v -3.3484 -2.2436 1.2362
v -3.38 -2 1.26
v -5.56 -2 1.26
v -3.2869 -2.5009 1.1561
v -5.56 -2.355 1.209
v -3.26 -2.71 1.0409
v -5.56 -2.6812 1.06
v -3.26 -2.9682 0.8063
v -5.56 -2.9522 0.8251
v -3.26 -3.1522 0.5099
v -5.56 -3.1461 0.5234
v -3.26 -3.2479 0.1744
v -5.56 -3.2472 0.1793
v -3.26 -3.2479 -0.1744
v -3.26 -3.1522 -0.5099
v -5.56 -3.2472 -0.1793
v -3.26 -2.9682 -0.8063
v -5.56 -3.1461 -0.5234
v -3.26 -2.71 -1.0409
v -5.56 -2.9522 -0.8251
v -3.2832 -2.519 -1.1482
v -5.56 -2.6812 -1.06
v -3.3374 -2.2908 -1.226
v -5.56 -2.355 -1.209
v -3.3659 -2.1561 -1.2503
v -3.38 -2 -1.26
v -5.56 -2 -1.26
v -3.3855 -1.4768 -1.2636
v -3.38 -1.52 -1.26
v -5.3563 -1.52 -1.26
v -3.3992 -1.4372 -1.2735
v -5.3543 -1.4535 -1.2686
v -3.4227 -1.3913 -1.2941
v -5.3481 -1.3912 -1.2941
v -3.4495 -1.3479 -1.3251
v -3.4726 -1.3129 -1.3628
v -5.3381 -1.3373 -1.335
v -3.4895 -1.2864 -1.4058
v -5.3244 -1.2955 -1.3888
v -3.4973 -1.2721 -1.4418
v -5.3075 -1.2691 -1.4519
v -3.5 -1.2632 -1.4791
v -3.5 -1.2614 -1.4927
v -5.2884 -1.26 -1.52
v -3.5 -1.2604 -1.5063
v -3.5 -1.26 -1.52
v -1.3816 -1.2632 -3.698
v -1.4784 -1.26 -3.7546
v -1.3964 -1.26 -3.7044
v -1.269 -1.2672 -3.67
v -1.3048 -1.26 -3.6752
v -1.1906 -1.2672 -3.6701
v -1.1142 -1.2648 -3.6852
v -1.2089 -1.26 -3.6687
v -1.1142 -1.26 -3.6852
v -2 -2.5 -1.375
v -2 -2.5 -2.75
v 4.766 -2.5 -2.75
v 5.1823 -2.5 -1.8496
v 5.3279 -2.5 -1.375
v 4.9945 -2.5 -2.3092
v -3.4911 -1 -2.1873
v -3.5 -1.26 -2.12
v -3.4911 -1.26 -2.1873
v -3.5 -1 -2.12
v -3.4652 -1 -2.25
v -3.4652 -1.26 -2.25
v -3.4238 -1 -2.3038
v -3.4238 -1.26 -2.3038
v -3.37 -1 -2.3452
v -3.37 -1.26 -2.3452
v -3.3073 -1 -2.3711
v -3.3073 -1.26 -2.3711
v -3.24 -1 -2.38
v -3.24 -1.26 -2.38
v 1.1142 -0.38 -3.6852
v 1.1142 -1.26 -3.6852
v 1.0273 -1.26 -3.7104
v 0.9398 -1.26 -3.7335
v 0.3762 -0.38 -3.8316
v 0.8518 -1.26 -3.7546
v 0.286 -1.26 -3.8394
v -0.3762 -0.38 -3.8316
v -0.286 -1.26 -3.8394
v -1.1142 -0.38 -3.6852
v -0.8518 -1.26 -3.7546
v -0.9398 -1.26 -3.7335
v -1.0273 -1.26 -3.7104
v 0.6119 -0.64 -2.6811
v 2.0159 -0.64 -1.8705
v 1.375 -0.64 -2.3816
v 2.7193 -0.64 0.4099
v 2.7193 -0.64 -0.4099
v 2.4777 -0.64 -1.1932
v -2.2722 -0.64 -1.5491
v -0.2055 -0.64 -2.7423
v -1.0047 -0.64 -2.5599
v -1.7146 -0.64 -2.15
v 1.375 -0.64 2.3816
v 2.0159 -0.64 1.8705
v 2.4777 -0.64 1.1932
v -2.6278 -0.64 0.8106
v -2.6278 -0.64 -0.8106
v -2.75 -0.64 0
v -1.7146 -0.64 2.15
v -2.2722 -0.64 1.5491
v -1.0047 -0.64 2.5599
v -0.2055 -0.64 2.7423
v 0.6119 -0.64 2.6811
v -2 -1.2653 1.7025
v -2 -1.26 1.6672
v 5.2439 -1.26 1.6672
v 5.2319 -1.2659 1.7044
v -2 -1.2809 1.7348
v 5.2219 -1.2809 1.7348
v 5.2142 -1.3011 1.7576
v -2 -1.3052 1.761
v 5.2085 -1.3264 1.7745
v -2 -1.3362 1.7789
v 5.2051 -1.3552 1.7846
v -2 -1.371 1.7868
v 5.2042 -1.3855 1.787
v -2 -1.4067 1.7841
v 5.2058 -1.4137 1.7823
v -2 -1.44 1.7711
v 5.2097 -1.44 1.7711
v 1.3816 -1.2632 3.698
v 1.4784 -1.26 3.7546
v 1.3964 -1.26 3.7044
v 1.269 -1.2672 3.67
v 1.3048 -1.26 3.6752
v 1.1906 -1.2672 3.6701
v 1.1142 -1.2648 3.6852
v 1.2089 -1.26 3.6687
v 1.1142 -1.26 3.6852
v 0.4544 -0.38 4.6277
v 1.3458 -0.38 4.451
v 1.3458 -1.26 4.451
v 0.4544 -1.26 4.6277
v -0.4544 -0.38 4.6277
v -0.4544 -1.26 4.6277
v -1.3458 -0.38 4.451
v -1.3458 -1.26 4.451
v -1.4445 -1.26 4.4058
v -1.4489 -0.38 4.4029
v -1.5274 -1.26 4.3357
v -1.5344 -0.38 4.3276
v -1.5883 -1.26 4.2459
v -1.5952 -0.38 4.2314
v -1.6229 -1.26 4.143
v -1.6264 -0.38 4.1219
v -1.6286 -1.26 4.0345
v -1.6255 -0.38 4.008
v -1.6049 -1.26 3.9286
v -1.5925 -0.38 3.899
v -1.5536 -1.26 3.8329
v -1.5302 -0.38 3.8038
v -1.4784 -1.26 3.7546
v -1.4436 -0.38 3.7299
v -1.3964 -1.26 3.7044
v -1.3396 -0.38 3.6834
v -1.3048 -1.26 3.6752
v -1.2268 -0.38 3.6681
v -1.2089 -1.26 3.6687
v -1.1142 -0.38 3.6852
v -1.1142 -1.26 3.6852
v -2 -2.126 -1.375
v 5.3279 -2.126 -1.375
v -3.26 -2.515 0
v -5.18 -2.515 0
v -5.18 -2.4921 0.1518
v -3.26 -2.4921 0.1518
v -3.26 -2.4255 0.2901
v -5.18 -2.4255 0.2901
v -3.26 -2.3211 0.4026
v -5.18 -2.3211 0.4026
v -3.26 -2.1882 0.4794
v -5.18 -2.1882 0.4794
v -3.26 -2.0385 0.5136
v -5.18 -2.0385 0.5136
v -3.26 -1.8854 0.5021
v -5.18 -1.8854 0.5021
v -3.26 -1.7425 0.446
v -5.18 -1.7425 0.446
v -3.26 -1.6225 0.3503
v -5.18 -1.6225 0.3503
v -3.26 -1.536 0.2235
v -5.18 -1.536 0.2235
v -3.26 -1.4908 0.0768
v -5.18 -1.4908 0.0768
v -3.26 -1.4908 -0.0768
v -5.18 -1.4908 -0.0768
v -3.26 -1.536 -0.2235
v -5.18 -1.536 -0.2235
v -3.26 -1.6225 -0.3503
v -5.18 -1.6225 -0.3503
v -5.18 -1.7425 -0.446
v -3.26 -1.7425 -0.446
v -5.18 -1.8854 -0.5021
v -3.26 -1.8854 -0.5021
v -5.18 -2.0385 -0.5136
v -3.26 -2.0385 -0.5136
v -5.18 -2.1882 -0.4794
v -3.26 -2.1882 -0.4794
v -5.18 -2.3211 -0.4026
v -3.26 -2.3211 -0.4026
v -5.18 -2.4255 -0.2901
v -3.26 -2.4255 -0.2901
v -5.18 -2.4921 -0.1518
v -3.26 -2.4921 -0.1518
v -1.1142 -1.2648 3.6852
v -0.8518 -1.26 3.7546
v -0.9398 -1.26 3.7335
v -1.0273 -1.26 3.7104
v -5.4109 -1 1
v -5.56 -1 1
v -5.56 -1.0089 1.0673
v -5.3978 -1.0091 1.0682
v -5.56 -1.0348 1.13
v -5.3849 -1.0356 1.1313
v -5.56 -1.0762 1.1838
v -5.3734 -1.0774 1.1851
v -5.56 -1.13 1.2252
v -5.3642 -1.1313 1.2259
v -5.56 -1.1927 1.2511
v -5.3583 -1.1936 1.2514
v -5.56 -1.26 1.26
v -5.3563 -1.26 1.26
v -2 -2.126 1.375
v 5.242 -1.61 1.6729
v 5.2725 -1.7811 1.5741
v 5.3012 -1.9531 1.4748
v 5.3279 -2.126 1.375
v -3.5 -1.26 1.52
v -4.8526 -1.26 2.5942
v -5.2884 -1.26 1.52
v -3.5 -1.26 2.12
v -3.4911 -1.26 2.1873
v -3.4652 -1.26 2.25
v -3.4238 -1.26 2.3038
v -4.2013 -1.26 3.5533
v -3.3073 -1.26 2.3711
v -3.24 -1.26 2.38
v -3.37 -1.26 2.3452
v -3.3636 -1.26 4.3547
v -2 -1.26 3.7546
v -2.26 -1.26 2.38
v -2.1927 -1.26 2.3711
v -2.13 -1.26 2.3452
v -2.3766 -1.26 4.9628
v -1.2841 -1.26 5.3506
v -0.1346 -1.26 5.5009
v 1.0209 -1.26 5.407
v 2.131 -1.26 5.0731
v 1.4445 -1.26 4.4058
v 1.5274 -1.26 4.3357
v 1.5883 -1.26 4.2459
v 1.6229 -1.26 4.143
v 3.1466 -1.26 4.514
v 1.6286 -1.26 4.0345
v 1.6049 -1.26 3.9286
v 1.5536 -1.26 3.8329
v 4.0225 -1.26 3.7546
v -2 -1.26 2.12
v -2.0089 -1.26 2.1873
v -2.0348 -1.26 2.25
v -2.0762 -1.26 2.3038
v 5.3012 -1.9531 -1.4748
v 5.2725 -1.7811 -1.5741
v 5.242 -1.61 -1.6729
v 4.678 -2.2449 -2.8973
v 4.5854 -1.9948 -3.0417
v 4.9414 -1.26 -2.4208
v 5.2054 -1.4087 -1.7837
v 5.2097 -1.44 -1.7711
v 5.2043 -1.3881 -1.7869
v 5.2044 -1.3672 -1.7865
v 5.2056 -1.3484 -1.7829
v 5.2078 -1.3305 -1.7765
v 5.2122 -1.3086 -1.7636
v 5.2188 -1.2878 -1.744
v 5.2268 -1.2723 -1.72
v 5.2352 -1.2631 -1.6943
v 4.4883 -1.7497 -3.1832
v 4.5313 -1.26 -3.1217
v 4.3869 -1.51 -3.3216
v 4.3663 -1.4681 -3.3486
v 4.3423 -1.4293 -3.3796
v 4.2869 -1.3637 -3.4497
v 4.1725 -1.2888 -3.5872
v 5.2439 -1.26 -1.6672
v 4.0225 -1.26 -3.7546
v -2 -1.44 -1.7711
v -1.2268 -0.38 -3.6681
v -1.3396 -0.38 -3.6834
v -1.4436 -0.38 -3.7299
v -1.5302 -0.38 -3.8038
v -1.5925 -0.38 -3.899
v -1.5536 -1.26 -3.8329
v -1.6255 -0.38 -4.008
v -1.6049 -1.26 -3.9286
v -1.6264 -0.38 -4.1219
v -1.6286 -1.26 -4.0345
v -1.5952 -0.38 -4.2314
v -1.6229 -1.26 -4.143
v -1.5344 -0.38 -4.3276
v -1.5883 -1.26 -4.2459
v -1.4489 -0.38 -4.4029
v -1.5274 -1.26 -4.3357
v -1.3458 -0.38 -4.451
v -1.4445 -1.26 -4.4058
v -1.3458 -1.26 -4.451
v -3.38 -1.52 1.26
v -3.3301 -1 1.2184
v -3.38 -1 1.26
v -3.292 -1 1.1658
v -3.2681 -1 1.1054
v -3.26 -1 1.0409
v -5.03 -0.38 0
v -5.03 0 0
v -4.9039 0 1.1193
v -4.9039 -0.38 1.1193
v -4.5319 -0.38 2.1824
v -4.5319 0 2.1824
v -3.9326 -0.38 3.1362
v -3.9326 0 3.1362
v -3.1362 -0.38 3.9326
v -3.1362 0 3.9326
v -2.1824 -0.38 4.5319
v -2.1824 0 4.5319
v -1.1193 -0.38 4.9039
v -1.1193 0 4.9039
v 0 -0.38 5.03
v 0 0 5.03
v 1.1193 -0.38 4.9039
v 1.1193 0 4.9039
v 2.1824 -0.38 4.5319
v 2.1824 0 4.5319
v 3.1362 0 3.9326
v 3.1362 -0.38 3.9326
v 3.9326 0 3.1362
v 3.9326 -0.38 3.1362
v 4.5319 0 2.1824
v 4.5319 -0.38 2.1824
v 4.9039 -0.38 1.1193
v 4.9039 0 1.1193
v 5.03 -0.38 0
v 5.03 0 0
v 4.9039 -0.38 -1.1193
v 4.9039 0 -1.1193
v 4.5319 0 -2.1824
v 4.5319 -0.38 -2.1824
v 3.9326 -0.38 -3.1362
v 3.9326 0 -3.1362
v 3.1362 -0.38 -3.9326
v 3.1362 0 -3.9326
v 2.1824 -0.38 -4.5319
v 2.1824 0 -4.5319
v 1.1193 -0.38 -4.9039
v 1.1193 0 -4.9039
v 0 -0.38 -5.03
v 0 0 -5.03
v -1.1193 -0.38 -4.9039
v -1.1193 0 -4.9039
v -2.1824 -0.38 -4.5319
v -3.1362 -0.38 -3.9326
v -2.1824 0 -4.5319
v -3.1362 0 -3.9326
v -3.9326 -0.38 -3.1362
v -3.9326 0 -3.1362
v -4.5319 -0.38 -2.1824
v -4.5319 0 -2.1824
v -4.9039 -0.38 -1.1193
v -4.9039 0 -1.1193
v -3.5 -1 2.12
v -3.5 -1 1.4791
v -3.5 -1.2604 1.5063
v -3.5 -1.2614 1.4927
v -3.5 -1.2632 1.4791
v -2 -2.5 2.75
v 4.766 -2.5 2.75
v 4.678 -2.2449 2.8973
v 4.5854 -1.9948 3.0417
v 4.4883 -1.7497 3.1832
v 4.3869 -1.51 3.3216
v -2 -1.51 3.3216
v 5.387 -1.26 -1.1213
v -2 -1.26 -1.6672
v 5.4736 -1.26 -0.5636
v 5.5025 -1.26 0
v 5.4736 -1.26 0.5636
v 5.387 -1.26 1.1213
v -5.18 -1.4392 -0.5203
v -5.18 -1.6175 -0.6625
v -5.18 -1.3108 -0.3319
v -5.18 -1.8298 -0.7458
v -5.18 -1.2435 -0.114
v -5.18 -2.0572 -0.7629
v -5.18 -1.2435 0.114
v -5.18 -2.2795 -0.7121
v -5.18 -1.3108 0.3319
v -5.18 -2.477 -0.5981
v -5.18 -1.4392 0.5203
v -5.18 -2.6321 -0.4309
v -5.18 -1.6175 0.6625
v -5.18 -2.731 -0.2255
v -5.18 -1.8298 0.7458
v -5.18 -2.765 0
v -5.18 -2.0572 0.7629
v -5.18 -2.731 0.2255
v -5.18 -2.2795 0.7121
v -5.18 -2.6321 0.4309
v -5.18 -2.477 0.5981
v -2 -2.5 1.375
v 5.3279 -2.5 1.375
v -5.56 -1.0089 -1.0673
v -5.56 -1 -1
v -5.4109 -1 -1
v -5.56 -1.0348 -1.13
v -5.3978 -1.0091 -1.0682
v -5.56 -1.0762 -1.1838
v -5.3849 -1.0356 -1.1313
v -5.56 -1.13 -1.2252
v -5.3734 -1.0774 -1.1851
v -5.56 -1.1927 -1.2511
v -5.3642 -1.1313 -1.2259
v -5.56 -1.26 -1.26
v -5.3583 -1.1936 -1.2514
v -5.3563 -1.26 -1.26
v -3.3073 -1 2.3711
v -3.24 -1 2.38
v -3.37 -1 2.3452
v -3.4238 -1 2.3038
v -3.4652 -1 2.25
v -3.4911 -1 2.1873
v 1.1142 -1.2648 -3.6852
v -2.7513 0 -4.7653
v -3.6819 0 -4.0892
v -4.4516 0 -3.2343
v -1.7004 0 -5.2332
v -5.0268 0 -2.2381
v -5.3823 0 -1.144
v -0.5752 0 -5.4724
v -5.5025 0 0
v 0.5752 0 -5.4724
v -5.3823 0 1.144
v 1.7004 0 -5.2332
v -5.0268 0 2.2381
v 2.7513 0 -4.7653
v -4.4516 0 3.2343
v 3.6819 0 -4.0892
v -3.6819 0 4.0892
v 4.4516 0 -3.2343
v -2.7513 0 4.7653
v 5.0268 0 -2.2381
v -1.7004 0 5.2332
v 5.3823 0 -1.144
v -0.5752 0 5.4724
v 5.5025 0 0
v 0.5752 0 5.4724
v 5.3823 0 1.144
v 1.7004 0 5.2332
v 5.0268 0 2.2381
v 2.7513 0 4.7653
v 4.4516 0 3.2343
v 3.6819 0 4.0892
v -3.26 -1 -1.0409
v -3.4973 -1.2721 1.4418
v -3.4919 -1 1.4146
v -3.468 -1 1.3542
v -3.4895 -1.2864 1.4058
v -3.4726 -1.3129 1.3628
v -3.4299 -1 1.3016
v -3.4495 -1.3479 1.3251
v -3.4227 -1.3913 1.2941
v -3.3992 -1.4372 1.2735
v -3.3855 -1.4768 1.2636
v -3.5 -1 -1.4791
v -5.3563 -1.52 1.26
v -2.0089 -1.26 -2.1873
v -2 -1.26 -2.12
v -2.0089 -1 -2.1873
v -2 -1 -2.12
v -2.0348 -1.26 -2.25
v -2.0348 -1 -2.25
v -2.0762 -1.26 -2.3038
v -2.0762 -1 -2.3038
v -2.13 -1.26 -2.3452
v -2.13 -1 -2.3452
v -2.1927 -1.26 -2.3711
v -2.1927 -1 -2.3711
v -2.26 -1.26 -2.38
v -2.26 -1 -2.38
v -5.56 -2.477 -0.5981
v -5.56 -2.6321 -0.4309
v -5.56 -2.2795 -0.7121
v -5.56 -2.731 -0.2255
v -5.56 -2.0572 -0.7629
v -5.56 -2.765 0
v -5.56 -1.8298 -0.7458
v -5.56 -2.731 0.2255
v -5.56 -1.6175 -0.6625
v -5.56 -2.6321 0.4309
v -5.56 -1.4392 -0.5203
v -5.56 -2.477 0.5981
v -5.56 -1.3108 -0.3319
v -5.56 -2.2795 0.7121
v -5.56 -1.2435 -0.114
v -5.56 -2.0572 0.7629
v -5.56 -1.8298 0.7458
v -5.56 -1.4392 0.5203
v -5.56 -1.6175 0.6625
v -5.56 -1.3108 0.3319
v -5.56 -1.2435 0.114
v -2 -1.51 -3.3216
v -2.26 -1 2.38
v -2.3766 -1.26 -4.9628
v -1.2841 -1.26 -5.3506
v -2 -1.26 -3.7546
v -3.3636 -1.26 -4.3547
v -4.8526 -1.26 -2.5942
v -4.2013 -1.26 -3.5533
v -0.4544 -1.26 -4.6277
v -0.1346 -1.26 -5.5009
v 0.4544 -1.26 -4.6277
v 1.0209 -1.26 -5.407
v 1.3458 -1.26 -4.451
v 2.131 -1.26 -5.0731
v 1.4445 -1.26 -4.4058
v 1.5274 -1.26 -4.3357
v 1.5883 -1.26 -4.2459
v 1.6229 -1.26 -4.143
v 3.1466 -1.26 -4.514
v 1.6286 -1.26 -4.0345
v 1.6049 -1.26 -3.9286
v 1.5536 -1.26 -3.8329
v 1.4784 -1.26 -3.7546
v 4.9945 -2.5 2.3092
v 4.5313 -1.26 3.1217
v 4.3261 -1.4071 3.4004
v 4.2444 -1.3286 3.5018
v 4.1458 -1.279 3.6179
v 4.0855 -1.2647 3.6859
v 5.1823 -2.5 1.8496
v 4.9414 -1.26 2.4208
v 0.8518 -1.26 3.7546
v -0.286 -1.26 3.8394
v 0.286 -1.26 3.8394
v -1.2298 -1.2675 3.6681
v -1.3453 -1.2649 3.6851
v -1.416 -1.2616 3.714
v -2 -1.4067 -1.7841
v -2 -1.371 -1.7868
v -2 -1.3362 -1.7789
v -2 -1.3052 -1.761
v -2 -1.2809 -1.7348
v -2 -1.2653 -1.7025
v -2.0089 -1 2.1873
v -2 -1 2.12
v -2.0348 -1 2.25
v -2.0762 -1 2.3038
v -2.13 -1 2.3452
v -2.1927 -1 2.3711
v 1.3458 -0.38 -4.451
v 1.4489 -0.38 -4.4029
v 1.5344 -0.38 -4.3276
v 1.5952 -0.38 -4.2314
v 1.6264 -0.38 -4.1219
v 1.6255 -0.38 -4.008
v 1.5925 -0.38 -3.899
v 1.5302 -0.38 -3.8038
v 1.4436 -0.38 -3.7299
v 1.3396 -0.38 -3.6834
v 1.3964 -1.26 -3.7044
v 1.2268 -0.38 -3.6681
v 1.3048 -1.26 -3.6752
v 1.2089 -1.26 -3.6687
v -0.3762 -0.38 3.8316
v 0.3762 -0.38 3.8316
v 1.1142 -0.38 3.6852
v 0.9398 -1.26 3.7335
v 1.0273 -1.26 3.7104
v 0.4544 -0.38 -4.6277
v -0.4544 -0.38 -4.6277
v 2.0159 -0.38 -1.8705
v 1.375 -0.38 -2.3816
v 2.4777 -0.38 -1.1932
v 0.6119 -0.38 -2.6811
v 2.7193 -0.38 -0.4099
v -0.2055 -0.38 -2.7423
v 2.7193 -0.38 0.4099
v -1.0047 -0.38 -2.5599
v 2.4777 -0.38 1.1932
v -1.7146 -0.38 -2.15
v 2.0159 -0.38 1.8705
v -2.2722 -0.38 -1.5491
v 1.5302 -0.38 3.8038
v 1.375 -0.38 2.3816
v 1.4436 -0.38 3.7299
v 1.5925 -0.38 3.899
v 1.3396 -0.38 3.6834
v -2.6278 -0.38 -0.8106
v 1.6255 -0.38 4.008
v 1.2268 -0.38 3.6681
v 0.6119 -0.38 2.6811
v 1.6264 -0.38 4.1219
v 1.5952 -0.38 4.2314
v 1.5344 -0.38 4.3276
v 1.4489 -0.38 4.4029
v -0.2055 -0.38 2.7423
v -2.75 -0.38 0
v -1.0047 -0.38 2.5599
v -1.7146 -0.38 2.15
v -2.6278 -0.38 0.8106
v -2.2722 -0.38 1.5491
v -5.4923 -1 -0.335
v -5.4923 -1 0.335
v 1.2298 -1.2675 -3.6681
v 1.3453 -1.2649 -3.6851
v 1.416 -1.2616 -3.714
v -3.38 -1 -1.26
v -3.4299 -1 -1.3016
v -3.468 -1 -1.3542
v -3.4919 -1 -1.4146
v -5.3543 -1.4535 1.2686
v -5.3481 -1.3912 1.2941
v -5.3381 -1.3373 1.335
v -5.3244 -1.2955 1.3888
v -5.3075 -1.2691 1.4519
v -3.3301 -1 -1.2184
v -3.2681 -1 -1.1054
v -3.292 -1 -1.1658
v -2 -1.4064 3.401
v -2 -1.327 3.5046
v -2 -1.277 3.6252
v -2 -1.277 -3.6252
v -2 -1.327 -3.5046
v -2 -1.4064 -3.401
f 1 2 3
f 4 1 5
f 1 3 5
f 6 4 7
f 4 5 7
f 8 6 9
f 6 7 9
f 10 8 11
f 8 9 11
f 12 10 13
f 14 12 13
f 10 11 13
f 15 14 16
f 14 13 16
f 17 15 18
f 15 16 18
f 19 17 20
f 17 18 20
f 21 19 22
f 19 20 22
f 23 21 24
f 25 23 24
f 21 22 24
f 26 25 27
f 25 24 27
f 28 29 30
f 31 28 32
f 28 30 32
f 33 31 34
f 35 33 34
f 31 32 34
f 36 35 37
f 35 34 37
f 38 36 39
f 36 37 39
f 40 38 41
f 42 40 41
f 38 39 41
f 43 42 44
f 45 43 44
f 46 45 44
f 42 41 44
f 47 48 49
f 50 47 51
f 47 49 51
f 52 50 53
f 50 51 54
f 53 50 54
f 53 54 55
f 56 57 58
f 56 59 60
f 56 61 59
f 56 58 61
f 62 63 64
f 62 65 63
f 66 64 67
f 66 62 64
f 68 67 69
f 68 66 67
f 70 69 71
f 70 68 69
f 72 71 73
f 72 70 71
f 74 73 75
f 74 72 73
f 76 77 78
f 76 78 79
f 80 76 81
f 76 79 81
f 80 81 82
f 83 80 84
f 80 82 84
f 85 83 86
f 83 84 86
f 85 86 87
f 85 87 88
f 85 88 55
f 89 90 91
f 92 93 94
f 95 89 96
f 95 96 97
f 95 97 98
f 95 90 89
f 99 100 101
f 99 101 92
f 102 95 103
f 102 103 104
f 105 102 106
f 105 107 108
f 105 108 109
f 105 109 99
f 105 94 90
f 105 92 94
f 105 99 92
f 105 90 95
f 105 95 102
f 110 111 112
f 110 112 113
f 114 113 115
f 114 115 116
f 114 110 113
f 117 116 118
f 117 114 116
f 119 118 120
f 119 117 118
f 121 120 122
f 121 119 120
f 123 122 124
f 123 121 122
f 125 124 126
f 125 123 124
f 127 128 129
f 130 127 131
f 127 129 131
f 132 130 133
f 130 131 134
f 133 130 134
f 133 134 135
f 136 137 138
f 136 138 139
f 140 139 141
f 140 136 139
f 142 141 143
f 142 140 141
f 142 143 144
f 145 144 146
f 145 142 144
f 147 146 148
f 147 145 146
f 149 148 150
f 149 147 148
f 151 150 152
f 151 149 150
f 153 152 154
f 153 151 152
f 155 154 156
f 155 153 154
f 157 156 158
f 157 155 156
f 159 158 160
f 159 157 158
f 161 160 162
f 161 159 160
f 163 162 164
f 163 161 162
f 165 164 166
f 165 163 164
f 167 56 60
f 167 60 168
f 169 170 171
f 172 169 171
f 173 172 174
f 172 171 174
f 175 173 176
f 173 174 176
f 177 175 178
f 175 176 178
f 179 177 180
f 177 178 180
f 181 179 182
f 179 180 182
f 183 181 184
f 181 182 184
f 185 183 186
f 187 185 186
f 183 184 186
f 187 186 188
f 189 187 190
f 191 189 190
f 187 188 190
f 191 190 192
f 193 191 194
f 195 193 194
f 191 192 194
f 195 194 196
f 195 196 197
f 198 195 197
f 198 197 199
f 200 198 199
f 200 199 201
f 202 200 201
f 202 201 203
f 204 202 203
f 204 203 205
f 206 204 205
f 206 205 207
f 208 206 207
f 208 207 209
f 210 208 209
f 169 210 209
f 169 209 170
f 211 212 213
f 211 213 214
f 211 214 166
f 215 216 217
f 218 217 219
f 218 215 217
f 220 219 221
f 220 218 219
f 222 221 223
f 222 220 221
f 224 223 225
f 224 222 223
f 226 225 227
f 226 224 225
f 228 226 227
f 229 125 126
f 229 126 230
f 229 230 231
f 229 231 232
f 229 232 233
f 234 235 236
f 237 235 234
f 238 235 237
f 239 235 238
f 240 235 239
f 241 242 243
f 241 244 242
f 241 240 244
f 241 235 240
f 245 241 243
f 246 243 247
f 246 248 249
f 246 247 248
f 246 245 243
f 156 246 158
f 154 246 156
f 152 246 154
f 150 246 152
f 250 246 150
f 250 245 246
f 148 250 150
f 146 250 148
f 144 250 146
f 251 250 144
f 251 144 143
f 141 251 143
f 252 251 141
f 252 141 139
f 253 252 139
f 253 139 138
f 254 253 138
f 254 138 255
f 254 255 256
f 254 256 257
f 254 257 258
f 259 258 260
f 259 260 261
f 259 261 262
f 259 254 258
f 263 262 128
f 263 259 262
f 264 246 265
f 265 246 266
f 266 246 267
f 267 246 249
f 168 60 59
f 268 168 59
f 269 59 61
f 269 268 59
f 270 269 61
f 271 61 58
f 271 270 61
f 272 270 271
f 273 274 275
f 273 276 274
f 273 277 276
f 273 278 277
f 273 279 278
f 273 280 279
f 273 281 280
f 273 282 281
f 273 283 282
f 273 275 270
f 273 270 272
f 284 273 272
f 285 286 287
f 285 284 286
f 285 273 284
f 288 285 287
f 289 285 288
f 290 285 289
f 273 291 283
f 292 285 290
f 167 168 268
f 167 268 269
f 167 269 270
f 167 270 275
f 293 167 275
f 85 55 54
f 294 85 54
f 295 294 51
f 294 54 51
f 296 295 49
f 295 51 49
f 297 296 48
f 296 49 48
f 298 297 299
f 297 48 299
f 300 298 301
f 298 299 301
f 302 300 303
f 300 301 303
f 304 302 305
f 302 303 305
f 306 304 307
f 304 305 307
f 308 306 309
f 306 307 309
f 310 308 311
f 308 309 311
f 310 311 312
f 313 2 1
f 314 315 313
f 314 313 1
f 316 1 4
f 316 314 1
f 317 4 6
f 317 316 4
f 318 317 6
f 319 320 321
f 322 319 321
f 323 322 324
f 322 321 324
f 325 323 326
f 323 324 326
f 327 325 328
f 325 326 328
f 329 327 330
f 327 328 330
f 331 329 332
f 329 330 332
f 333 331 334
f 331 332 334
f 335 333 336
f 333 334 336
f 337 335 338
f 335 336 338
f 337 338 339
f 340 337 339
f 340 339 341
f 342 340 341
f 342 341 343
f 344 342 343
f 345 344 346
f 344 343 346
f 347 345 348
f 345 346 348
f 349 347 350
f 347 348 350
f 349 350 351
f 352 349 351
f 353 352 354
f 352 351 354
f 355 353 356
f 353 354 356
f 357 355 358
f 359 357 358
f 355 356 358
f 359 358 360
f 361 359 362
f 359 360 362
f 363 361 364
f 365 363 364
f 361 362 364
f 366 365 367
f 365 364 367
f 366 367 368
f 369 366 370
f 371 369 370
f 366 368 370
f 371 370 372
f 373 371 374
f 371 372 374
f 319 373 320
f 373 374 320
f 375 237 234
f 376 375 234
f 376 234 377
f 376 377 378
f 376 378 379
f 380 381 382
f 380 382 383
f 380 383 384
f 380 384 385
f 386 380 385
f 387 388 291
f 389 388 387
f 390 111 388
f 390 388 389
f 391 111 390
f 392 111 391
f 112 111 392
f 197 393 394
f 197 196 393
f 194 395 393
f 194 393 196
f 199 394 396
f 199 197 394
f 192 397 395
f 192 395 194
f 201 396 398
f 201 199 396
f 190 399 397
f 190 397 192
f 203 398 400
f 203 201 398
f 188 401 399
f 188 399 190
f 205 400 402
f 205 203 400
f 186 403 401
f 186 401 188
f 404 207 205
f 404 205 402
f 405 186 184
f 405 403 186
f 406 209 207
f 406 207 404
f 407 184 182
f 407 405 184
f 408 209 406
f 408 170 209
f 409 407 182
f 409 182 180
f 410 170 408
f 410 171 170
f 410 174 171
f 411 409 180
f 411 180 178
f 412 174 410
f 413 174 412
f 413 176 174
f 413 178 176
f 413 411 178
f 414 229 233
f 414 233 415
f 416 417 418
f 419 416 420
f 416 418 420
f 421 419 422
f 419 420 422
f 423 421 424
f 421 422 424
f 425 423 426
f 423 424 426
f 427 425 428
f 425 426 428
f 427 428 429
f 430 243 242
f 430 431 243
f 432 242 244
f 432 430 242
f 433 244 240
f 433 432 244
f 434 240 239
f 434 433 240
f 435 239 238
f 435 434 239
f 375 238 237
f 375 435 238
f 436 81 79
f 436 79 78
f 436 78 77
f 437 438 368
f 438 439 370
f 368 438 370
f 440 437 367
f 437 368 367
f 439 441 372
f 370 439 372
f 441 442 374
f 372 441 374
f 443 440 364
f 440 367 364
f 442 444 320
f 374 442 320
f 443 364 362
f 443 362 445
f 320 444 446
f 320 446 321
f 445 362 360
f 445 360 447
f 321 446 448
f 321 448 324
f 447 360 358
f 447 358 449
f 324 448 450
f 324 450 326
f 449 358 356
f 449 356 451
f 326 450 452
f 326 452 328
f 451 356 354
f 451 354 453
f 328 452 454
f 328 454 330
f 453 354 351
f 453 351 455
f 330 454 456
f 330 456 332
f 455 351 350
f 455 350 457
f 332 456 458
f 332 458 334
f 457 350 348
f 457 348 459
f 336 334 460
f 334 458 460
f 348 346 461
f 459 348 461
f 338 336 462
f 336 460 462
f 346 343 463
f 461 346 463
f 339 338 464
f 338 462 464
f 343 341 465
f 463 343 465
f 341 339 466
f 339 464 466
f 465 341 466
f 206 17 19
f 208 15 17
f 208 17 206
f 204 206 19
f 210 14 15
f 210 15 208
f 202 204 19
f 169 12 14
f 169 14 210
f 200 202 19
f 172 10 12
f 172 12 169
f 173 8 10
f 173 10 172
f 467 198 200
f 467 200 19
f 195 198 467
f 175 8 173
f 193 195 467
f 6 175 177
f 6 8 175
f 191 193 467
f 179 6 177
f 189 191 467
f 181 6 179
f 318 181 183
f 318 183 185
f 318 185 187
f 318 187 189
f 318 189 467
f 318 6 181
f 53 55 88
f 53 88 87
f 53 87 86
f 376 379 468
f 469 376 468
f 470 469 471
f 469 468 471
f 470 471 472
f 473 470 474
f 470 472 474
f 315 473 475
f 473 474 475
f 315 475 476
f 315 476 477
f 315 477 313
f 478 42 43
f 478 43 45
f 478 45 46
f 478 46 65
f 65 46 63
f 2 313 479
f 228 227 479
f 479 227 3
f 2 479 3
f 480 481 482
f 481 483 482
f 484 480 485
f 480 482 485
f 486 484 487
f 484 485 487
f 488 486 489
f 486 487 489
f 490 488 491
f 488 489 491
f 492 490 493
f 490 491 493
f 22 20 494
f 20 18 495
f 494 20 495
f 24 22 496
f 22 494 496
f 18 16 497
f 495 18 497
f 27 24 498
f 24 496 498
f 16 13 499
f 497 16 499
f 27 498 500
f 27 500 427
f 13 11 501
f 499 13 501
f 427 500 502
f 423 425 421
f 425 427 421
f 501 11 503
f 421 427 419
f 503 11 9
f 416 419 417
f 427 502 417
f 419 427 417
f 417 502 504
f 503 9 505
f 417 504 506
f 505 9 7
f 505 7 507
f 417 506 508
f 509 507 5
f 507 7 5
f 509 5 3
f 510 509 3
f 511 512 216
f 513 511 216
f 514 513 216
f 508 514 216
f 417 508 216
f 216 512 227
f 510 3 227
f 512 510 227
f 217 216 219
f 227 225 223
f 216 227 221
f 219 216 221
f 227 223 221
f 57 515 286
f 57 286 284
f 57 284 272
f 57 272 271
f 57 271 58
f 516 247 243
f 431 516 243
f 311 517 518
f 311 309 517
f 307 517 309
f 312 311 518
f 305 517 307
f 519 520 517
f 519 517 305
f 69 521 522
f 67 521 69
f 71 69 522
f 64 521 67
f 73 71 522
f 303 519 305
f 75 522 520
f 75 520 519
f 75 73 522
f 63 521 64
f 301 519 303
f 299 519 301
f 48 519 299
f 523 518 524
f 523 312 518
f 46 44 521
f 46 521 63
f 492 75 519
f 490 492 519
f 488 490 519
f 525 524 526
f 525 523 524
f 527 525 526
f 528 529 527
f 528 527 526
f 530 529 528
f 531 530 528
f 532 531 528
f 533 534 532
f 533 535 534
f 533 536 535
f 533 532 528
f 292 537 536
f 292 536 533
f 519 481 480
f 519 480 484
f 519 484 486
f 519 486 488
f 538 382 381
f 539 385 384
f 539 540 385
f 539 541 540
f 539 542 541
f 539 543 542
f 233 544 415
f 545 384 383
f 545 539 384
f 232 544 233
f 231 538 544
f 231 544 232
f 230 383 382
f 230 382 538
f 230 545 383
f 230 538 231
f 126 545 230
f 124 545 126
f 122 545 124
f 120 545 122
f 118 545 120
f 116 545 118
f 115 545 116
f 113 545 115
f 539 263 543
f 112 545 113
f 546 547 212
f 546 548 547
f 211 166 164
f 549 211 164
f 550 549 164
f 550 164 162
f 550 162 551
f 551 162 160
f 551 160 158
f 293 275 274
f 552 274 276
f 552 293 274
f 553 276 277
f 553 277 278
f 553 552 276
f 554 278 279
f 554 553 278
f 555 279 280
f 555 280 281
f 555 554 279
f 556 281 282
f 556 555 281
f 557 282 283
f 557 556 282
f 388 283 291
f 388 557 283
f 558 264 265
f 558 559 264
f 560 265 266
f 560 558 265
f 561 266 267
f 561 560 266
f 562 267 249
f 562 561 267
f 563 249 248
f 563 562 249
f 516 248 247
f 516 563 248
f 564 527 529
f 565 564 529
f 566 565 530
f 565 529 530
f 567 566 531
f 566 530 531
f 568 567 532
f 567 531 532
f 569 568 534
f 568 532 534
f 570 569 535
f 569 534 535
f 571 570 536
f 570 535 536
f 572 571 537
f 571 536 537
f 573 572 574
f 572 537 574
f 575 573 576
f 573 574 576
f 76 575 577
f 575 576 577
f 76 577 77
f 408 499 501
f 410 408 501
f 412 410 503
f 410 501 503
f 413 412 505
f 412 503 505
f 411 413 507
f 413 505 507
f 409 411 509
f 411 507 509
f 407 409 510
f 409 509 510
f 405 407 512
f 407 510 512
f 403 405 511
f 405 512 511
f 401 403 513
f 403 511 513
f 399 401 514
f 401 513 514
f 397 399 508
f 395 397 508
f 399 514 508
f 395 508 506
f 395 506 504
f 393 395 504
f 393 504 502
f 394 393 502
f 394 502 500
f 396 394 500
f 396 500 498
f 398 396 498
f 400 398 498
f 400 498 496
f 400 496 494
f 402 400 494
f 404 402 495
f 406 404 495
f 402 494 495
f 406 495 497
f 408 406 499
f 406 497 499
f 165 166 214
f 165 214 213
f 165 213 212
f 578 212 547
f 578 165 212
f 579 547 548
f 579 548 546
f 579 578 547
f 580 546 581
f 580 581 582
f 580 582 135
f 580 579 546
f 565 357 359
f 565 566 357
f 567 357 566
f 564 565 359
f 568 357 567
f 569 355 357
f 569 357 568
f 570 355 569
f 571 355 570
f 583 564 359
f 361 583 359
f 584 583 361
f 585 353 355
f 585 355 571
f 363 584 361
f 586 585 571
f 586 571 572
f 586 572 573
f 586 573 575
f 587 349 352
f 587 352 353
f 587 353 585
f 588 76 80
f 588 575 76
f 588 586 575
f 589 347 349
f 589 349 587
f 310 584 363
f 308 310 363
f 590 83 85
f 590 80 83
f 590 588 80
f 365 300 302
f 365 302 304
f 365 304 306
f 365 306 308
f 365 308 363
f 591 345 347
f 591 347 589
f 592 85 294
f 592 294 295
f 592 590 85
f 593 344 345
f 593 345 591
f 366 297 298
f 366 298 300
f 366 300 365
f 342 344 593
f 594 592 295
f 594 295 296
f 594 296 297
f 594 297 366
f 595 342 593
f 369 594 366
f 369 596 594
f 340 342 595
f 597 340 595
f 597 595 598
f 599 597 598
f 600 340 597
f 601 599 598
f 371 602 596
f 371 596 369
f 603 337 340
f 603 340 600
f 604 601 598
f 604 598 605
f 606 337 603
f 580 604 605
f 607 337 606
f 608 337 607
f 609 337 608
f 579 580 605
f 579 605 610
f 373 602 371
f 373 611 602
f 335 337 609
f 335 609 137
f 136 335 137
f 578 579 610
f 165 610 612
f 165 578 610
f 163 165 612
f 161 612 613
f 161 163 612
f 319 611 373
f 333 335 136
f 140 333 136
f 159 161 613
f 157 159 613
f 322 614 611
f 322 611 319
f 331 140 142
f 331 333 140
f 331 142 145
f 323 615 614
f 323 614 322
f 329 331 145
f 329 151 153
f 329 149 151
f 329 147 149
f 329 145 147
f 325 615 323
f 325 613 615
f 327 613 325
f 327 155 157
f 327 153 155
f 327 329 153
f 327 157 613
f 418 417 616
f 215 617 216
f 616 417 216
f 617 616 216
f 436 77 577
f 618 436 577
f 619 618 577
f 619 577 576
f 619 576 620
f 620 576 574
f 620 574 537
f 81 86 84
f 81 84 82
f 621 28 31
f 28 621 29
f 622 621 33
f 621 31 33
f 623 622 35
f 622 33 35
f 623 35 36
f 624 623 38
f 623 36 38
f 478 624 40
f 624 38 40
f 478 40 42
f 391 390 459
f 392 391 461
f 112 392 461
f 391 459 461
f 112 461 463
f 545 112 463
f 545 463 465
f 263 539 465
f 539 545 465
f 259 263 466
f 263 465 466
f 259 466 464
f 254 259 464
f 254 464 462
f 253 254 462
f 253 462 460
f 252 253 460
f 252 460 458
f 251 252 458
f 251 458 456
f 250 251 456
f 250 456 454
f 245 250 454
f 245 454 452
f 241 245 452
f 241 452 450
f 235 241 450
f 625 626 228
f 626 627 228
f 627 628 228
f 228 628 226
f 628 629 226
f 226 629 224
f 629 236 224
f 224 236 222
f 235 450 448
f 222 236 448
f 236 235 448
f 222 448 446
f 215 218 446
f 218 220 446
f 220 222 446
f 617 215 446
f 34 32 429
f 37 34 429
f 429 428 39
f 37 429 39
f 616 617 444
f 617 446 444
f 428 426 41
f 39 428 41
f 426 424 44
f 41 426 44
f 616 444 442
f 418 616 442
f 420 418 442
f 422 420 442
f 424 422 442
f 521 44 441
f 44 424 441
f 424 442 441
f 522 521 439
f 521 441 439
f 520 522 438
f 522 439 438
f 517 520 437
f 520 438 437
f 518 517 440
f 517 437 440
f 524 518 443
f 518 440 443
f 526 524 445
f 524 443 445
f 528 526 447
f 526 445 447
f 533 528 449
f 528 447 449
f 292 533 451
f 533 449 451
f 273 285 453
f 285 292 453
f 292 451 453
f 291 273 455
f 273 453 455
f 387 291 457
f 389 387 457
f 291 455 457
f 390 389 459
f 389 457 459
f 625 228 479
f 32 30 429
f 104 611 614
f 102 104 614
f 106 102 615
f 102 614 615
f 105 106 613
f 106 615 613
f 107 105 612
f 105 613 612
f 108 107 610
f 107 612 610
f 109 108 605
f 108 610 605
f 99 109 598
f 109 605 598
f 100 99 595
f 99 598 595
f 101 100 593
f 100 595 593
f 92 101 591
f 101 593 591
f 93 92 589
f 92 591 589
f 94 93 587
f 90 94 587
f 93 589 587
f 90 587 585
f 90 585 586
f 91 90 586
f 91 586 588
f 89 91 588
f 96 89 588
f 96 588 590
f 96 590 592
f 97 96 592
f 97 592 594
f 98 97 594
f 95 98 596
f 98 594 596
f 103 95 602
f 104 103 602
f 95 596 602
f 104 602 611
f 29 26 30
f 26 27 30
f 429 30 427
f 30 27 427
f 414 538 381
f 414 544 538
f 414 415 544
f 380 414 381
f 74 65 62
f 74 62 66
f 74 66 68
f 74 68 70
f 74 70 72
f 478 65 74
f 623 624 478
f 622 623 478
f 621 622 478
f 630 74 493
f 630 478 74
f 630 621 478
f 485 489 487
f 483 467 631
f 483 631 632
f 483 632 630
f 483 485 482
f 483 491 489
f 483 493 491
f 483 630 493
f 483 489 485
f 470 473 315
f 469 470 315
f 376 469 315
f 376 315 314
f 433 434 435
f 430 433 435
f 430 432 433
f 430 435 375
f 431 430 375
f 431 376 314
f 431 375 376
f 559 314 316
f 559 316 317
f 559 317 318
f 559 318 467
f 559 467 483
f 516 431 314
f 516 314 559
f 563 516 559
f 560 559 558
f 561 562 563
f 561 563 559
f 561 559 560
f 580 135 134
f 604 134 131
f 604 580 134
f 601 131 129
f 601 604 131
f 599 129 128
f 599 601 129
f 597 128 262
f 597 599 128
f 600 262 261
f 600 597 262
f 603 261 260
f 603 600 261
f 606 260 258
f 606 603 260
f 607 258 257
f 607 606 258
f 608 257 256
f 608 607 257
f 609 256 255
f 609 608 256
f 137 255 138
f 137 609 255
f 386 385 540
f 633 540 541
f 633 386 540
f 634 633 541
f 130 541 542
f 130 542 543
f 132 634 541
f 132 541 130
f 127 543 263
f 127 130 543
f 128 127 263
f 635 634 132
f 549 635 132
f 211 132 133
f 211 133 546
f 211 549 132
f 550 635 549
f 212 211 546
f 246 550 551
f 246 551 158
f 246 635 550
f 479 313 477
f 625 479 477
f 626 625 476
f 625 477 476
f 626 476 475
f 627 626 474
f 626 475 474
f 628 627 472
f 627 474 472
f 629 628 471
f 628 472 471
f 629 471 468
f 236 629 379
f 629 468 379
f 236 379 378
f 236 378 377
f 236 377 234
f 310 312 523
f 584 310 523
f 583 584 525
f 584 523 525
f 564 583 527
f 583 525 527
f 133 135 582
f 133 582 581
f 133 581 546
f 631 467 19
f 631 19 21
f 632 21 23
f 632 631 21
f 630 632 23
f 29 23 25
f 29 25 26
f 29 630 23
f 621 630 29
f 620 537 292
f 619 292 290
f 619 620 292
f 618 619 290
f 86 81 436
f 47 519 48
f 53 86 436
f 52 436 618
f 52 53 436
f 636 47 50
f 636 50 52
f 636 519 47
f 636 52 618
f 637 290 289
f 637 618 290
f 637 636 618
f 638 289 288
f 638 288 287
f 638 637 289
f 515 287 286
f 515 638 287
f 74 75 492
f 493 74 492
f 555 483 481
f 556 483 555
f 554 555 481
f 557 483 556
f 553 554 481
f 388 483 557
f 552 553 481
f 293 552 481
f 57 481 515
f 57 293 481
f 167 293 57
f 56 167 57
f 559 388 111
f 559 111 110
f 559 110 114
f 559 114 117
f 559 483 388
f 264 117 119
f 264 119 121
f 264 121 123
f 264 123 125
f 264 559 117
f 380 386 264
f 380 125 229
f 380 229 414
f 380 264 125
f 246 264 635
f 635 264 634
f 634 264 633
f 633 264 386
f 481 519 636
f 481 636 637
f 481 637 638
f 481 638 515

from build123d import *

# Parameters (mm, degrees)
F0_R           = 5.5025
F1_DEPTH       = 1.26
F2_R           = 5.03
F3_DEPTH       = 0.38
F4_R           = 2.75
F5_DEPTH       = 0.26
F7_DEPTH       = 7.5
F9_DEPTH       = 0.26
F10_R          = 0.26
F13_DEPTH      = 2.3
F14_R          = 0.765
F15_DEPTH      = 0.38
F16_R          = 0.515
F17_DEPTH      = 10.6835
F18_DEPTH      = 1.5
F19_F1_R       = 0.26
F19_F2_R       = 0.26
F21_DEPTH      = 15
F23_END_RADIUS = 5.5025
F23_REACH      = 10.1867902517
F25_DEPTH      = 10


# Not quite as in the source:
# - after a boolean that leaves OpenCascade's solid faulty, fix() repairs it


with BuildPart() as f1:
    # F0 (on Front) → F1 (new body)
    with BuildSketch(Plane.XZ):
        Circle(F0_R)
    extrude(amount=F1_DEPTH)

    # F2 (on face) → F3 (cut)
    with BuildSketch(Plane(origin=(0, 0, 0), x_dir=(-1, 0, 0), z_dir=(0, 1, 0))):
        Circle(F2_R)
    extrude(amount=-F3_DEPTH, mode=Mode.SUBTRACT)

    # F4 (on face) → F5 (cut)
    with BuildSketch(Plane(origin=(0, -0.38, 0), x_dir=(-1, 0, 0), z_dir=(0, 1, 0))):
        Circle(F4_R)
    extrude(amount=-F5_DEPTH, mode=Mode.SUBTRACT)

    # F6 (on face) → F7 (cut, symmetric)
    with BuildSketch(Plane.XZ.offset(1.26)):
        with BuildLine():
            ThreePointArc((-1.1142352941, 3.6852380804), (0, 3.85), (1.1142352941, 3.6852380804))
            ThreePointArc((1.1142352941, 3.6852380804), (1.6128818785, 3.952355253), (1.3457647059, 4.4510018374))
            ThreePointArc((1.3457647059, 4.4510018374), (0, 4.65), (-1.3457647059, 4.4510018374))
            ThreePointArc((-1.3457647059, 4.4510018374), (-1.6128818785, 3.952355253), (-1.1142352941, 3.6852380804))
        make_face()
        with BuildLine():
            ThreePointArc((1.1142352941, -3.6852380804), (0, -3.85), (-1.1142352941, -3.6852380804))
            ThreePointArc((-1.1142352941, -3.6852380804), (-1.6128818785, -3.952355253), (-1.3457647059, -4.4510018374))
            ThreePointArc((-1.3457647059, -4.4510018374), (0, -4.65), (1.3457647059, -4.4510018374))
            ThreePointArc((1.3457647059, -4.4510018374), (1.6128818785, -3.952355253), (1.1142352941, -3.6852380804))
        make_face()
    extrude(amount=F7_DEPTH, both=True, mode=Mode.SUBTRACT)

    # F8 (on face) → F9 (cut)
    with BuildSketch(Plane.XZ.offset(1.26)):
        with BuildLine():
            Line((-2, -2.38), (-2, 2.38))
            Line((-2, 2.38), (-3.5, 2.38))
            Line((-3.5, 2.38), (-3.5, 1.479089023))
            ThreePointArc((-3.5, 1.479089023), (-3.468035085, 1.354189063), (-3.38, 1.26))
            ThreePointArc((-3.38, 1.26), (-3.291964915, 1.165810937), (-3.26, 1.040910977))
            Line((-3.26, 1.040910977), (-3.26, -1.040910977))
            ThreePointArc((-3.26, -1.040910977), (-3.291964915, -1.165810937), (-3.38, -1.26))
            ThreePointArc((-3.38, -1.26), (-3.468035085, -1.354189063), (-3.5, -1.479089023))
            Line((-3.5, -1.479089023), (-3.5, -2.38))
            Line((-3.5, -2.38), (-2, -2.38))
        make_face()
    extrude(amount=-F9_DEPTH, mode=Mode.SUBTRACT)

    # F10
    f10_edges = [f1.edges().sort_by_distance(p)[0] for p in [
        (-2, -1.13, 2.38),
        (-3.5, -1.13, 2.38),
        (-3.5, -1.13, -2.38),
        (-2, -1.13, -2.38),
    ]]
    fillet(f10_edges, radius=F10_R)

    # F12 (on offset) → F13 (join, through all)
    with BuildSketch(Plane.YZ.offset(-5.56)):
        with BuildLine():
            Line((-1, -1.26), (-1, 1.26))
            Line((-1, 1.26), (-2, 1.26))
            ThreePointArc((-2, 1.26), (-3.26, 0), (-2, -1.26))
            Line((-2, -1.26), (-1, -1.26))
        make_face()
    extrude(amount=F13_DEPTH)

    # F14 (on face) → F15 (cut)
    with BuildSketch(Plane(origin=(-5.56, 0, 0), x_dir=(0, -1, 0), z_dir=(-1, 0, 0))):
        with Locations((2, 0)):
            Circle(F14_R)
    extrude(amount=-F15_DEPTH, mode=Mode.SUBTRACT)

    # F16 (on face) → F17 (cut, through all)
    with BuildSketch(Plane(origin=(-5.18, 0, 0), x_dir=(0, -1, 0), z_dir=(-1, 0, 0))):
        with Locations((2, 0)):
            Circle(F16_R)
    extrude(amount=-F17_DEPTH, mode=Mode.SUBTRACT)

    # F18 (cut): a face of the model
    f18_faces = [f1.faces().sort_by_distance(p)[0] for p in [
        (-2.6893148123, -1, 0),
    ]]
    extrude(f18_faces, amount=F18_DEPTH, mode=Mode.SUBTRACT)

    # F19: fillet of radius 0.26 on 4 edges, made by hand

    # F19_f1
    f19_f1_edges = [f1.edges().sort_by_distance(p)[0] for p in [
        (-5.4581479725, -1, 1.26),
        (-5.4581479725, -1, -1.26),
    ]]
    fillet(f19_f1_edges, radius=F19_F1_R)

    # F19_f2
    f19_f2_edges = [f1.edges().sort_by_distance(p)[0] for p in [
        (-4.3681479725, -1.26, 1.26),
        (-4.3681479725, -1.26, -1.26),
    ]]
    fillet(f19_f2_edges, radius=F19_F2_R)

    # F20 (on face) → F21 (cut)
    with BuildSketch(Plane.XZ.offset(1)):
        with BuildLine():
            ThreePointArc((-2.26, -2.38), (-2.0761522369, -2.3038477631), (-2, -2.12))
            Line((-2, -2.12), (-2, 2.12))
            ThreePointArc((-2, 2.12), (-2.0761522369, 2.3038477631), (-2.26, 2.38))
            Line((-2.26, 2.38), (-3.24, 2.38))
            ThreePointArc((-3.24, 2.38), (-3.4238477631, 2.3038477631), (-3.5, 2.12))
            Line((-3.5, 2.12), (-3.5, 1.479089023))
            ThreePointArc((-3.5, 1.479089023), (-3.468035085, 1.354189063), (-3.38, 1.26))
            ThreePointArc((-3.38, 1.26), (-3.2919649151, 1.165810937), (-3.2600000001, 1.0409109771))
            Line((-3.2600000001, 1.0409109771), (-3.2599999999, -1.0409109769))
            ThreePointArc((-3.2599999999, -1.0409109769), (-3.2919649149, -1.1658109369), (-3.38, -1.26))
            ThreePointArc((-3.38, -1.26), (-3.468035085, -1.354189063), (-3.5, -1.479089023))
            Line((-3.5, -1.479089023), (-3.5, -2.12))
            ThreePointArc((-3.5, -2.12), (-3.4238477631, -2.3038477631), (-3.24, -2.38))
            Line((-3.24, -2.38), (-2.26, -2.38))
        make_face()
    extrude(amount=F21_DEPTH, mode=Mode.SUBTRACT)

    f23_end = (Plane.ZX.offset(-0.76) * Cylinder(F23_END_RADIUS, 52.2556470224, mode=Mode.PRIVATE)).faces().sort_by_distance((-5.5025, -0.76, 0))[0]
    # F22 (on face) → F23 (join, up to the whole of a round face its end follows)
    with BuildSketch(Plane(origin=(-2, 0, 0), x_dir=(0, -1, 0), z_dir=(-1, 0, 0))):
        with BuildLine():
            Line((2.5, 2.75), (1.51, 3.3215767665))
            ThreePointArc((1.51, 3.3215767665), (1.3269872981, 3.5045894684), (1.26, 3.7545894684))
            Line((1.26, 3.7545894684), (1.26, 1.875))
            Line((1.26, 1.875), (1.26, 1.6671539031))
            ThreePointArc((1.26, 1.6671539031), (1.32, 1.7710769515), (1.44, 1.7710769515))
            Line((1.44, 1.7710769515), (2.1260254038, 1.375))
            Line((2.1260254038, 1.375), (2.5, 1.375))
            Line((2.5, 1.375), (2.5, 2.75))
        make_face()
        with BuildLine():
            ThreePointArc((1.26, -3.7545894684), (1.3269872981, -3.5045894684), (1.51, -3.3215767665))
            Line((1.51, -3.3215767665), (2.5, -2.75))
            Line((2.5, -2.75), (2.5, -1.375))
            Line((2.5, -1.375), (2.1260254038, -1.375))
            Line((2.1260254038, -1.375), (1.44, -1.7710769515))
            ThreePointArc((1.44, -1.7710769515), (1.32, -1.7710769515), (1.26, -1.6671539031))
            Line((1.26, -1.6671539031), (1.26, -1.875))
            Line((1.26, -1.875), (1.26, -3.7545894684))
        make_face()
    f23_long = extrude(amount=-F23_REACH, mode=Mode.PRIVATE)
    add(split(f23_long, bisect_by=f23_end, keep=Keep.BOTTOM, mode=Mode.PRIVATE))

    add(f1.part.fix(), mode=Mode.REPLACE)

    # F24 (on face) → F25 (cut)
    with BuildSketch(Plane(origin=(0, -0.38, 0), x_dir=(-1, 0, 0), z_dir=(0, 1, 0))):
        with BuildLine():
            ThreePointArc((-1.1142352941, -3.6852380804), (-1.6128818785, -3.952355253), (-1.3457647059, -4.4510018374))
            ThreePointArc((-1.3457647059, -4.4510018374), (0, -4.65), (1.3457647059, -4.4510018374))
            ThreePointArc((1.3457647059, -4.4510018374), (1.6128818785, -3.952355253), (1.1142352941, -3.6852380804))
            ThreePointArc((1.1142352941, -3.6852380804), (0, -3.85), (-1.1142352941, -3.6852380804))
        make_face()
        with BuildLine():
            ThreePointArc((-1.1142352941, 3.6852380804), (0, 3.85), (1.1142352941, 3.6852380804))
            ThreePointArc((1.1142352941, 3.6852380804), (1.6128818785, 3.952355253), (1.3457647059, 4.4510018374))
            ThreePointArc((1.3457647059, 4.4510018374), (0, 4.65), (-1.3457647059, 4.4510018374))
            ThreePointArc((-1.3457647059, 4.4510018374), (-1.6128818785, 3.952355253), (-1.1142352941, 3.6852380804))
        make_face()
    extrude(amount=-F25_DEPTH, mode=Mode.SUBTRACT)


solid = f1.part
